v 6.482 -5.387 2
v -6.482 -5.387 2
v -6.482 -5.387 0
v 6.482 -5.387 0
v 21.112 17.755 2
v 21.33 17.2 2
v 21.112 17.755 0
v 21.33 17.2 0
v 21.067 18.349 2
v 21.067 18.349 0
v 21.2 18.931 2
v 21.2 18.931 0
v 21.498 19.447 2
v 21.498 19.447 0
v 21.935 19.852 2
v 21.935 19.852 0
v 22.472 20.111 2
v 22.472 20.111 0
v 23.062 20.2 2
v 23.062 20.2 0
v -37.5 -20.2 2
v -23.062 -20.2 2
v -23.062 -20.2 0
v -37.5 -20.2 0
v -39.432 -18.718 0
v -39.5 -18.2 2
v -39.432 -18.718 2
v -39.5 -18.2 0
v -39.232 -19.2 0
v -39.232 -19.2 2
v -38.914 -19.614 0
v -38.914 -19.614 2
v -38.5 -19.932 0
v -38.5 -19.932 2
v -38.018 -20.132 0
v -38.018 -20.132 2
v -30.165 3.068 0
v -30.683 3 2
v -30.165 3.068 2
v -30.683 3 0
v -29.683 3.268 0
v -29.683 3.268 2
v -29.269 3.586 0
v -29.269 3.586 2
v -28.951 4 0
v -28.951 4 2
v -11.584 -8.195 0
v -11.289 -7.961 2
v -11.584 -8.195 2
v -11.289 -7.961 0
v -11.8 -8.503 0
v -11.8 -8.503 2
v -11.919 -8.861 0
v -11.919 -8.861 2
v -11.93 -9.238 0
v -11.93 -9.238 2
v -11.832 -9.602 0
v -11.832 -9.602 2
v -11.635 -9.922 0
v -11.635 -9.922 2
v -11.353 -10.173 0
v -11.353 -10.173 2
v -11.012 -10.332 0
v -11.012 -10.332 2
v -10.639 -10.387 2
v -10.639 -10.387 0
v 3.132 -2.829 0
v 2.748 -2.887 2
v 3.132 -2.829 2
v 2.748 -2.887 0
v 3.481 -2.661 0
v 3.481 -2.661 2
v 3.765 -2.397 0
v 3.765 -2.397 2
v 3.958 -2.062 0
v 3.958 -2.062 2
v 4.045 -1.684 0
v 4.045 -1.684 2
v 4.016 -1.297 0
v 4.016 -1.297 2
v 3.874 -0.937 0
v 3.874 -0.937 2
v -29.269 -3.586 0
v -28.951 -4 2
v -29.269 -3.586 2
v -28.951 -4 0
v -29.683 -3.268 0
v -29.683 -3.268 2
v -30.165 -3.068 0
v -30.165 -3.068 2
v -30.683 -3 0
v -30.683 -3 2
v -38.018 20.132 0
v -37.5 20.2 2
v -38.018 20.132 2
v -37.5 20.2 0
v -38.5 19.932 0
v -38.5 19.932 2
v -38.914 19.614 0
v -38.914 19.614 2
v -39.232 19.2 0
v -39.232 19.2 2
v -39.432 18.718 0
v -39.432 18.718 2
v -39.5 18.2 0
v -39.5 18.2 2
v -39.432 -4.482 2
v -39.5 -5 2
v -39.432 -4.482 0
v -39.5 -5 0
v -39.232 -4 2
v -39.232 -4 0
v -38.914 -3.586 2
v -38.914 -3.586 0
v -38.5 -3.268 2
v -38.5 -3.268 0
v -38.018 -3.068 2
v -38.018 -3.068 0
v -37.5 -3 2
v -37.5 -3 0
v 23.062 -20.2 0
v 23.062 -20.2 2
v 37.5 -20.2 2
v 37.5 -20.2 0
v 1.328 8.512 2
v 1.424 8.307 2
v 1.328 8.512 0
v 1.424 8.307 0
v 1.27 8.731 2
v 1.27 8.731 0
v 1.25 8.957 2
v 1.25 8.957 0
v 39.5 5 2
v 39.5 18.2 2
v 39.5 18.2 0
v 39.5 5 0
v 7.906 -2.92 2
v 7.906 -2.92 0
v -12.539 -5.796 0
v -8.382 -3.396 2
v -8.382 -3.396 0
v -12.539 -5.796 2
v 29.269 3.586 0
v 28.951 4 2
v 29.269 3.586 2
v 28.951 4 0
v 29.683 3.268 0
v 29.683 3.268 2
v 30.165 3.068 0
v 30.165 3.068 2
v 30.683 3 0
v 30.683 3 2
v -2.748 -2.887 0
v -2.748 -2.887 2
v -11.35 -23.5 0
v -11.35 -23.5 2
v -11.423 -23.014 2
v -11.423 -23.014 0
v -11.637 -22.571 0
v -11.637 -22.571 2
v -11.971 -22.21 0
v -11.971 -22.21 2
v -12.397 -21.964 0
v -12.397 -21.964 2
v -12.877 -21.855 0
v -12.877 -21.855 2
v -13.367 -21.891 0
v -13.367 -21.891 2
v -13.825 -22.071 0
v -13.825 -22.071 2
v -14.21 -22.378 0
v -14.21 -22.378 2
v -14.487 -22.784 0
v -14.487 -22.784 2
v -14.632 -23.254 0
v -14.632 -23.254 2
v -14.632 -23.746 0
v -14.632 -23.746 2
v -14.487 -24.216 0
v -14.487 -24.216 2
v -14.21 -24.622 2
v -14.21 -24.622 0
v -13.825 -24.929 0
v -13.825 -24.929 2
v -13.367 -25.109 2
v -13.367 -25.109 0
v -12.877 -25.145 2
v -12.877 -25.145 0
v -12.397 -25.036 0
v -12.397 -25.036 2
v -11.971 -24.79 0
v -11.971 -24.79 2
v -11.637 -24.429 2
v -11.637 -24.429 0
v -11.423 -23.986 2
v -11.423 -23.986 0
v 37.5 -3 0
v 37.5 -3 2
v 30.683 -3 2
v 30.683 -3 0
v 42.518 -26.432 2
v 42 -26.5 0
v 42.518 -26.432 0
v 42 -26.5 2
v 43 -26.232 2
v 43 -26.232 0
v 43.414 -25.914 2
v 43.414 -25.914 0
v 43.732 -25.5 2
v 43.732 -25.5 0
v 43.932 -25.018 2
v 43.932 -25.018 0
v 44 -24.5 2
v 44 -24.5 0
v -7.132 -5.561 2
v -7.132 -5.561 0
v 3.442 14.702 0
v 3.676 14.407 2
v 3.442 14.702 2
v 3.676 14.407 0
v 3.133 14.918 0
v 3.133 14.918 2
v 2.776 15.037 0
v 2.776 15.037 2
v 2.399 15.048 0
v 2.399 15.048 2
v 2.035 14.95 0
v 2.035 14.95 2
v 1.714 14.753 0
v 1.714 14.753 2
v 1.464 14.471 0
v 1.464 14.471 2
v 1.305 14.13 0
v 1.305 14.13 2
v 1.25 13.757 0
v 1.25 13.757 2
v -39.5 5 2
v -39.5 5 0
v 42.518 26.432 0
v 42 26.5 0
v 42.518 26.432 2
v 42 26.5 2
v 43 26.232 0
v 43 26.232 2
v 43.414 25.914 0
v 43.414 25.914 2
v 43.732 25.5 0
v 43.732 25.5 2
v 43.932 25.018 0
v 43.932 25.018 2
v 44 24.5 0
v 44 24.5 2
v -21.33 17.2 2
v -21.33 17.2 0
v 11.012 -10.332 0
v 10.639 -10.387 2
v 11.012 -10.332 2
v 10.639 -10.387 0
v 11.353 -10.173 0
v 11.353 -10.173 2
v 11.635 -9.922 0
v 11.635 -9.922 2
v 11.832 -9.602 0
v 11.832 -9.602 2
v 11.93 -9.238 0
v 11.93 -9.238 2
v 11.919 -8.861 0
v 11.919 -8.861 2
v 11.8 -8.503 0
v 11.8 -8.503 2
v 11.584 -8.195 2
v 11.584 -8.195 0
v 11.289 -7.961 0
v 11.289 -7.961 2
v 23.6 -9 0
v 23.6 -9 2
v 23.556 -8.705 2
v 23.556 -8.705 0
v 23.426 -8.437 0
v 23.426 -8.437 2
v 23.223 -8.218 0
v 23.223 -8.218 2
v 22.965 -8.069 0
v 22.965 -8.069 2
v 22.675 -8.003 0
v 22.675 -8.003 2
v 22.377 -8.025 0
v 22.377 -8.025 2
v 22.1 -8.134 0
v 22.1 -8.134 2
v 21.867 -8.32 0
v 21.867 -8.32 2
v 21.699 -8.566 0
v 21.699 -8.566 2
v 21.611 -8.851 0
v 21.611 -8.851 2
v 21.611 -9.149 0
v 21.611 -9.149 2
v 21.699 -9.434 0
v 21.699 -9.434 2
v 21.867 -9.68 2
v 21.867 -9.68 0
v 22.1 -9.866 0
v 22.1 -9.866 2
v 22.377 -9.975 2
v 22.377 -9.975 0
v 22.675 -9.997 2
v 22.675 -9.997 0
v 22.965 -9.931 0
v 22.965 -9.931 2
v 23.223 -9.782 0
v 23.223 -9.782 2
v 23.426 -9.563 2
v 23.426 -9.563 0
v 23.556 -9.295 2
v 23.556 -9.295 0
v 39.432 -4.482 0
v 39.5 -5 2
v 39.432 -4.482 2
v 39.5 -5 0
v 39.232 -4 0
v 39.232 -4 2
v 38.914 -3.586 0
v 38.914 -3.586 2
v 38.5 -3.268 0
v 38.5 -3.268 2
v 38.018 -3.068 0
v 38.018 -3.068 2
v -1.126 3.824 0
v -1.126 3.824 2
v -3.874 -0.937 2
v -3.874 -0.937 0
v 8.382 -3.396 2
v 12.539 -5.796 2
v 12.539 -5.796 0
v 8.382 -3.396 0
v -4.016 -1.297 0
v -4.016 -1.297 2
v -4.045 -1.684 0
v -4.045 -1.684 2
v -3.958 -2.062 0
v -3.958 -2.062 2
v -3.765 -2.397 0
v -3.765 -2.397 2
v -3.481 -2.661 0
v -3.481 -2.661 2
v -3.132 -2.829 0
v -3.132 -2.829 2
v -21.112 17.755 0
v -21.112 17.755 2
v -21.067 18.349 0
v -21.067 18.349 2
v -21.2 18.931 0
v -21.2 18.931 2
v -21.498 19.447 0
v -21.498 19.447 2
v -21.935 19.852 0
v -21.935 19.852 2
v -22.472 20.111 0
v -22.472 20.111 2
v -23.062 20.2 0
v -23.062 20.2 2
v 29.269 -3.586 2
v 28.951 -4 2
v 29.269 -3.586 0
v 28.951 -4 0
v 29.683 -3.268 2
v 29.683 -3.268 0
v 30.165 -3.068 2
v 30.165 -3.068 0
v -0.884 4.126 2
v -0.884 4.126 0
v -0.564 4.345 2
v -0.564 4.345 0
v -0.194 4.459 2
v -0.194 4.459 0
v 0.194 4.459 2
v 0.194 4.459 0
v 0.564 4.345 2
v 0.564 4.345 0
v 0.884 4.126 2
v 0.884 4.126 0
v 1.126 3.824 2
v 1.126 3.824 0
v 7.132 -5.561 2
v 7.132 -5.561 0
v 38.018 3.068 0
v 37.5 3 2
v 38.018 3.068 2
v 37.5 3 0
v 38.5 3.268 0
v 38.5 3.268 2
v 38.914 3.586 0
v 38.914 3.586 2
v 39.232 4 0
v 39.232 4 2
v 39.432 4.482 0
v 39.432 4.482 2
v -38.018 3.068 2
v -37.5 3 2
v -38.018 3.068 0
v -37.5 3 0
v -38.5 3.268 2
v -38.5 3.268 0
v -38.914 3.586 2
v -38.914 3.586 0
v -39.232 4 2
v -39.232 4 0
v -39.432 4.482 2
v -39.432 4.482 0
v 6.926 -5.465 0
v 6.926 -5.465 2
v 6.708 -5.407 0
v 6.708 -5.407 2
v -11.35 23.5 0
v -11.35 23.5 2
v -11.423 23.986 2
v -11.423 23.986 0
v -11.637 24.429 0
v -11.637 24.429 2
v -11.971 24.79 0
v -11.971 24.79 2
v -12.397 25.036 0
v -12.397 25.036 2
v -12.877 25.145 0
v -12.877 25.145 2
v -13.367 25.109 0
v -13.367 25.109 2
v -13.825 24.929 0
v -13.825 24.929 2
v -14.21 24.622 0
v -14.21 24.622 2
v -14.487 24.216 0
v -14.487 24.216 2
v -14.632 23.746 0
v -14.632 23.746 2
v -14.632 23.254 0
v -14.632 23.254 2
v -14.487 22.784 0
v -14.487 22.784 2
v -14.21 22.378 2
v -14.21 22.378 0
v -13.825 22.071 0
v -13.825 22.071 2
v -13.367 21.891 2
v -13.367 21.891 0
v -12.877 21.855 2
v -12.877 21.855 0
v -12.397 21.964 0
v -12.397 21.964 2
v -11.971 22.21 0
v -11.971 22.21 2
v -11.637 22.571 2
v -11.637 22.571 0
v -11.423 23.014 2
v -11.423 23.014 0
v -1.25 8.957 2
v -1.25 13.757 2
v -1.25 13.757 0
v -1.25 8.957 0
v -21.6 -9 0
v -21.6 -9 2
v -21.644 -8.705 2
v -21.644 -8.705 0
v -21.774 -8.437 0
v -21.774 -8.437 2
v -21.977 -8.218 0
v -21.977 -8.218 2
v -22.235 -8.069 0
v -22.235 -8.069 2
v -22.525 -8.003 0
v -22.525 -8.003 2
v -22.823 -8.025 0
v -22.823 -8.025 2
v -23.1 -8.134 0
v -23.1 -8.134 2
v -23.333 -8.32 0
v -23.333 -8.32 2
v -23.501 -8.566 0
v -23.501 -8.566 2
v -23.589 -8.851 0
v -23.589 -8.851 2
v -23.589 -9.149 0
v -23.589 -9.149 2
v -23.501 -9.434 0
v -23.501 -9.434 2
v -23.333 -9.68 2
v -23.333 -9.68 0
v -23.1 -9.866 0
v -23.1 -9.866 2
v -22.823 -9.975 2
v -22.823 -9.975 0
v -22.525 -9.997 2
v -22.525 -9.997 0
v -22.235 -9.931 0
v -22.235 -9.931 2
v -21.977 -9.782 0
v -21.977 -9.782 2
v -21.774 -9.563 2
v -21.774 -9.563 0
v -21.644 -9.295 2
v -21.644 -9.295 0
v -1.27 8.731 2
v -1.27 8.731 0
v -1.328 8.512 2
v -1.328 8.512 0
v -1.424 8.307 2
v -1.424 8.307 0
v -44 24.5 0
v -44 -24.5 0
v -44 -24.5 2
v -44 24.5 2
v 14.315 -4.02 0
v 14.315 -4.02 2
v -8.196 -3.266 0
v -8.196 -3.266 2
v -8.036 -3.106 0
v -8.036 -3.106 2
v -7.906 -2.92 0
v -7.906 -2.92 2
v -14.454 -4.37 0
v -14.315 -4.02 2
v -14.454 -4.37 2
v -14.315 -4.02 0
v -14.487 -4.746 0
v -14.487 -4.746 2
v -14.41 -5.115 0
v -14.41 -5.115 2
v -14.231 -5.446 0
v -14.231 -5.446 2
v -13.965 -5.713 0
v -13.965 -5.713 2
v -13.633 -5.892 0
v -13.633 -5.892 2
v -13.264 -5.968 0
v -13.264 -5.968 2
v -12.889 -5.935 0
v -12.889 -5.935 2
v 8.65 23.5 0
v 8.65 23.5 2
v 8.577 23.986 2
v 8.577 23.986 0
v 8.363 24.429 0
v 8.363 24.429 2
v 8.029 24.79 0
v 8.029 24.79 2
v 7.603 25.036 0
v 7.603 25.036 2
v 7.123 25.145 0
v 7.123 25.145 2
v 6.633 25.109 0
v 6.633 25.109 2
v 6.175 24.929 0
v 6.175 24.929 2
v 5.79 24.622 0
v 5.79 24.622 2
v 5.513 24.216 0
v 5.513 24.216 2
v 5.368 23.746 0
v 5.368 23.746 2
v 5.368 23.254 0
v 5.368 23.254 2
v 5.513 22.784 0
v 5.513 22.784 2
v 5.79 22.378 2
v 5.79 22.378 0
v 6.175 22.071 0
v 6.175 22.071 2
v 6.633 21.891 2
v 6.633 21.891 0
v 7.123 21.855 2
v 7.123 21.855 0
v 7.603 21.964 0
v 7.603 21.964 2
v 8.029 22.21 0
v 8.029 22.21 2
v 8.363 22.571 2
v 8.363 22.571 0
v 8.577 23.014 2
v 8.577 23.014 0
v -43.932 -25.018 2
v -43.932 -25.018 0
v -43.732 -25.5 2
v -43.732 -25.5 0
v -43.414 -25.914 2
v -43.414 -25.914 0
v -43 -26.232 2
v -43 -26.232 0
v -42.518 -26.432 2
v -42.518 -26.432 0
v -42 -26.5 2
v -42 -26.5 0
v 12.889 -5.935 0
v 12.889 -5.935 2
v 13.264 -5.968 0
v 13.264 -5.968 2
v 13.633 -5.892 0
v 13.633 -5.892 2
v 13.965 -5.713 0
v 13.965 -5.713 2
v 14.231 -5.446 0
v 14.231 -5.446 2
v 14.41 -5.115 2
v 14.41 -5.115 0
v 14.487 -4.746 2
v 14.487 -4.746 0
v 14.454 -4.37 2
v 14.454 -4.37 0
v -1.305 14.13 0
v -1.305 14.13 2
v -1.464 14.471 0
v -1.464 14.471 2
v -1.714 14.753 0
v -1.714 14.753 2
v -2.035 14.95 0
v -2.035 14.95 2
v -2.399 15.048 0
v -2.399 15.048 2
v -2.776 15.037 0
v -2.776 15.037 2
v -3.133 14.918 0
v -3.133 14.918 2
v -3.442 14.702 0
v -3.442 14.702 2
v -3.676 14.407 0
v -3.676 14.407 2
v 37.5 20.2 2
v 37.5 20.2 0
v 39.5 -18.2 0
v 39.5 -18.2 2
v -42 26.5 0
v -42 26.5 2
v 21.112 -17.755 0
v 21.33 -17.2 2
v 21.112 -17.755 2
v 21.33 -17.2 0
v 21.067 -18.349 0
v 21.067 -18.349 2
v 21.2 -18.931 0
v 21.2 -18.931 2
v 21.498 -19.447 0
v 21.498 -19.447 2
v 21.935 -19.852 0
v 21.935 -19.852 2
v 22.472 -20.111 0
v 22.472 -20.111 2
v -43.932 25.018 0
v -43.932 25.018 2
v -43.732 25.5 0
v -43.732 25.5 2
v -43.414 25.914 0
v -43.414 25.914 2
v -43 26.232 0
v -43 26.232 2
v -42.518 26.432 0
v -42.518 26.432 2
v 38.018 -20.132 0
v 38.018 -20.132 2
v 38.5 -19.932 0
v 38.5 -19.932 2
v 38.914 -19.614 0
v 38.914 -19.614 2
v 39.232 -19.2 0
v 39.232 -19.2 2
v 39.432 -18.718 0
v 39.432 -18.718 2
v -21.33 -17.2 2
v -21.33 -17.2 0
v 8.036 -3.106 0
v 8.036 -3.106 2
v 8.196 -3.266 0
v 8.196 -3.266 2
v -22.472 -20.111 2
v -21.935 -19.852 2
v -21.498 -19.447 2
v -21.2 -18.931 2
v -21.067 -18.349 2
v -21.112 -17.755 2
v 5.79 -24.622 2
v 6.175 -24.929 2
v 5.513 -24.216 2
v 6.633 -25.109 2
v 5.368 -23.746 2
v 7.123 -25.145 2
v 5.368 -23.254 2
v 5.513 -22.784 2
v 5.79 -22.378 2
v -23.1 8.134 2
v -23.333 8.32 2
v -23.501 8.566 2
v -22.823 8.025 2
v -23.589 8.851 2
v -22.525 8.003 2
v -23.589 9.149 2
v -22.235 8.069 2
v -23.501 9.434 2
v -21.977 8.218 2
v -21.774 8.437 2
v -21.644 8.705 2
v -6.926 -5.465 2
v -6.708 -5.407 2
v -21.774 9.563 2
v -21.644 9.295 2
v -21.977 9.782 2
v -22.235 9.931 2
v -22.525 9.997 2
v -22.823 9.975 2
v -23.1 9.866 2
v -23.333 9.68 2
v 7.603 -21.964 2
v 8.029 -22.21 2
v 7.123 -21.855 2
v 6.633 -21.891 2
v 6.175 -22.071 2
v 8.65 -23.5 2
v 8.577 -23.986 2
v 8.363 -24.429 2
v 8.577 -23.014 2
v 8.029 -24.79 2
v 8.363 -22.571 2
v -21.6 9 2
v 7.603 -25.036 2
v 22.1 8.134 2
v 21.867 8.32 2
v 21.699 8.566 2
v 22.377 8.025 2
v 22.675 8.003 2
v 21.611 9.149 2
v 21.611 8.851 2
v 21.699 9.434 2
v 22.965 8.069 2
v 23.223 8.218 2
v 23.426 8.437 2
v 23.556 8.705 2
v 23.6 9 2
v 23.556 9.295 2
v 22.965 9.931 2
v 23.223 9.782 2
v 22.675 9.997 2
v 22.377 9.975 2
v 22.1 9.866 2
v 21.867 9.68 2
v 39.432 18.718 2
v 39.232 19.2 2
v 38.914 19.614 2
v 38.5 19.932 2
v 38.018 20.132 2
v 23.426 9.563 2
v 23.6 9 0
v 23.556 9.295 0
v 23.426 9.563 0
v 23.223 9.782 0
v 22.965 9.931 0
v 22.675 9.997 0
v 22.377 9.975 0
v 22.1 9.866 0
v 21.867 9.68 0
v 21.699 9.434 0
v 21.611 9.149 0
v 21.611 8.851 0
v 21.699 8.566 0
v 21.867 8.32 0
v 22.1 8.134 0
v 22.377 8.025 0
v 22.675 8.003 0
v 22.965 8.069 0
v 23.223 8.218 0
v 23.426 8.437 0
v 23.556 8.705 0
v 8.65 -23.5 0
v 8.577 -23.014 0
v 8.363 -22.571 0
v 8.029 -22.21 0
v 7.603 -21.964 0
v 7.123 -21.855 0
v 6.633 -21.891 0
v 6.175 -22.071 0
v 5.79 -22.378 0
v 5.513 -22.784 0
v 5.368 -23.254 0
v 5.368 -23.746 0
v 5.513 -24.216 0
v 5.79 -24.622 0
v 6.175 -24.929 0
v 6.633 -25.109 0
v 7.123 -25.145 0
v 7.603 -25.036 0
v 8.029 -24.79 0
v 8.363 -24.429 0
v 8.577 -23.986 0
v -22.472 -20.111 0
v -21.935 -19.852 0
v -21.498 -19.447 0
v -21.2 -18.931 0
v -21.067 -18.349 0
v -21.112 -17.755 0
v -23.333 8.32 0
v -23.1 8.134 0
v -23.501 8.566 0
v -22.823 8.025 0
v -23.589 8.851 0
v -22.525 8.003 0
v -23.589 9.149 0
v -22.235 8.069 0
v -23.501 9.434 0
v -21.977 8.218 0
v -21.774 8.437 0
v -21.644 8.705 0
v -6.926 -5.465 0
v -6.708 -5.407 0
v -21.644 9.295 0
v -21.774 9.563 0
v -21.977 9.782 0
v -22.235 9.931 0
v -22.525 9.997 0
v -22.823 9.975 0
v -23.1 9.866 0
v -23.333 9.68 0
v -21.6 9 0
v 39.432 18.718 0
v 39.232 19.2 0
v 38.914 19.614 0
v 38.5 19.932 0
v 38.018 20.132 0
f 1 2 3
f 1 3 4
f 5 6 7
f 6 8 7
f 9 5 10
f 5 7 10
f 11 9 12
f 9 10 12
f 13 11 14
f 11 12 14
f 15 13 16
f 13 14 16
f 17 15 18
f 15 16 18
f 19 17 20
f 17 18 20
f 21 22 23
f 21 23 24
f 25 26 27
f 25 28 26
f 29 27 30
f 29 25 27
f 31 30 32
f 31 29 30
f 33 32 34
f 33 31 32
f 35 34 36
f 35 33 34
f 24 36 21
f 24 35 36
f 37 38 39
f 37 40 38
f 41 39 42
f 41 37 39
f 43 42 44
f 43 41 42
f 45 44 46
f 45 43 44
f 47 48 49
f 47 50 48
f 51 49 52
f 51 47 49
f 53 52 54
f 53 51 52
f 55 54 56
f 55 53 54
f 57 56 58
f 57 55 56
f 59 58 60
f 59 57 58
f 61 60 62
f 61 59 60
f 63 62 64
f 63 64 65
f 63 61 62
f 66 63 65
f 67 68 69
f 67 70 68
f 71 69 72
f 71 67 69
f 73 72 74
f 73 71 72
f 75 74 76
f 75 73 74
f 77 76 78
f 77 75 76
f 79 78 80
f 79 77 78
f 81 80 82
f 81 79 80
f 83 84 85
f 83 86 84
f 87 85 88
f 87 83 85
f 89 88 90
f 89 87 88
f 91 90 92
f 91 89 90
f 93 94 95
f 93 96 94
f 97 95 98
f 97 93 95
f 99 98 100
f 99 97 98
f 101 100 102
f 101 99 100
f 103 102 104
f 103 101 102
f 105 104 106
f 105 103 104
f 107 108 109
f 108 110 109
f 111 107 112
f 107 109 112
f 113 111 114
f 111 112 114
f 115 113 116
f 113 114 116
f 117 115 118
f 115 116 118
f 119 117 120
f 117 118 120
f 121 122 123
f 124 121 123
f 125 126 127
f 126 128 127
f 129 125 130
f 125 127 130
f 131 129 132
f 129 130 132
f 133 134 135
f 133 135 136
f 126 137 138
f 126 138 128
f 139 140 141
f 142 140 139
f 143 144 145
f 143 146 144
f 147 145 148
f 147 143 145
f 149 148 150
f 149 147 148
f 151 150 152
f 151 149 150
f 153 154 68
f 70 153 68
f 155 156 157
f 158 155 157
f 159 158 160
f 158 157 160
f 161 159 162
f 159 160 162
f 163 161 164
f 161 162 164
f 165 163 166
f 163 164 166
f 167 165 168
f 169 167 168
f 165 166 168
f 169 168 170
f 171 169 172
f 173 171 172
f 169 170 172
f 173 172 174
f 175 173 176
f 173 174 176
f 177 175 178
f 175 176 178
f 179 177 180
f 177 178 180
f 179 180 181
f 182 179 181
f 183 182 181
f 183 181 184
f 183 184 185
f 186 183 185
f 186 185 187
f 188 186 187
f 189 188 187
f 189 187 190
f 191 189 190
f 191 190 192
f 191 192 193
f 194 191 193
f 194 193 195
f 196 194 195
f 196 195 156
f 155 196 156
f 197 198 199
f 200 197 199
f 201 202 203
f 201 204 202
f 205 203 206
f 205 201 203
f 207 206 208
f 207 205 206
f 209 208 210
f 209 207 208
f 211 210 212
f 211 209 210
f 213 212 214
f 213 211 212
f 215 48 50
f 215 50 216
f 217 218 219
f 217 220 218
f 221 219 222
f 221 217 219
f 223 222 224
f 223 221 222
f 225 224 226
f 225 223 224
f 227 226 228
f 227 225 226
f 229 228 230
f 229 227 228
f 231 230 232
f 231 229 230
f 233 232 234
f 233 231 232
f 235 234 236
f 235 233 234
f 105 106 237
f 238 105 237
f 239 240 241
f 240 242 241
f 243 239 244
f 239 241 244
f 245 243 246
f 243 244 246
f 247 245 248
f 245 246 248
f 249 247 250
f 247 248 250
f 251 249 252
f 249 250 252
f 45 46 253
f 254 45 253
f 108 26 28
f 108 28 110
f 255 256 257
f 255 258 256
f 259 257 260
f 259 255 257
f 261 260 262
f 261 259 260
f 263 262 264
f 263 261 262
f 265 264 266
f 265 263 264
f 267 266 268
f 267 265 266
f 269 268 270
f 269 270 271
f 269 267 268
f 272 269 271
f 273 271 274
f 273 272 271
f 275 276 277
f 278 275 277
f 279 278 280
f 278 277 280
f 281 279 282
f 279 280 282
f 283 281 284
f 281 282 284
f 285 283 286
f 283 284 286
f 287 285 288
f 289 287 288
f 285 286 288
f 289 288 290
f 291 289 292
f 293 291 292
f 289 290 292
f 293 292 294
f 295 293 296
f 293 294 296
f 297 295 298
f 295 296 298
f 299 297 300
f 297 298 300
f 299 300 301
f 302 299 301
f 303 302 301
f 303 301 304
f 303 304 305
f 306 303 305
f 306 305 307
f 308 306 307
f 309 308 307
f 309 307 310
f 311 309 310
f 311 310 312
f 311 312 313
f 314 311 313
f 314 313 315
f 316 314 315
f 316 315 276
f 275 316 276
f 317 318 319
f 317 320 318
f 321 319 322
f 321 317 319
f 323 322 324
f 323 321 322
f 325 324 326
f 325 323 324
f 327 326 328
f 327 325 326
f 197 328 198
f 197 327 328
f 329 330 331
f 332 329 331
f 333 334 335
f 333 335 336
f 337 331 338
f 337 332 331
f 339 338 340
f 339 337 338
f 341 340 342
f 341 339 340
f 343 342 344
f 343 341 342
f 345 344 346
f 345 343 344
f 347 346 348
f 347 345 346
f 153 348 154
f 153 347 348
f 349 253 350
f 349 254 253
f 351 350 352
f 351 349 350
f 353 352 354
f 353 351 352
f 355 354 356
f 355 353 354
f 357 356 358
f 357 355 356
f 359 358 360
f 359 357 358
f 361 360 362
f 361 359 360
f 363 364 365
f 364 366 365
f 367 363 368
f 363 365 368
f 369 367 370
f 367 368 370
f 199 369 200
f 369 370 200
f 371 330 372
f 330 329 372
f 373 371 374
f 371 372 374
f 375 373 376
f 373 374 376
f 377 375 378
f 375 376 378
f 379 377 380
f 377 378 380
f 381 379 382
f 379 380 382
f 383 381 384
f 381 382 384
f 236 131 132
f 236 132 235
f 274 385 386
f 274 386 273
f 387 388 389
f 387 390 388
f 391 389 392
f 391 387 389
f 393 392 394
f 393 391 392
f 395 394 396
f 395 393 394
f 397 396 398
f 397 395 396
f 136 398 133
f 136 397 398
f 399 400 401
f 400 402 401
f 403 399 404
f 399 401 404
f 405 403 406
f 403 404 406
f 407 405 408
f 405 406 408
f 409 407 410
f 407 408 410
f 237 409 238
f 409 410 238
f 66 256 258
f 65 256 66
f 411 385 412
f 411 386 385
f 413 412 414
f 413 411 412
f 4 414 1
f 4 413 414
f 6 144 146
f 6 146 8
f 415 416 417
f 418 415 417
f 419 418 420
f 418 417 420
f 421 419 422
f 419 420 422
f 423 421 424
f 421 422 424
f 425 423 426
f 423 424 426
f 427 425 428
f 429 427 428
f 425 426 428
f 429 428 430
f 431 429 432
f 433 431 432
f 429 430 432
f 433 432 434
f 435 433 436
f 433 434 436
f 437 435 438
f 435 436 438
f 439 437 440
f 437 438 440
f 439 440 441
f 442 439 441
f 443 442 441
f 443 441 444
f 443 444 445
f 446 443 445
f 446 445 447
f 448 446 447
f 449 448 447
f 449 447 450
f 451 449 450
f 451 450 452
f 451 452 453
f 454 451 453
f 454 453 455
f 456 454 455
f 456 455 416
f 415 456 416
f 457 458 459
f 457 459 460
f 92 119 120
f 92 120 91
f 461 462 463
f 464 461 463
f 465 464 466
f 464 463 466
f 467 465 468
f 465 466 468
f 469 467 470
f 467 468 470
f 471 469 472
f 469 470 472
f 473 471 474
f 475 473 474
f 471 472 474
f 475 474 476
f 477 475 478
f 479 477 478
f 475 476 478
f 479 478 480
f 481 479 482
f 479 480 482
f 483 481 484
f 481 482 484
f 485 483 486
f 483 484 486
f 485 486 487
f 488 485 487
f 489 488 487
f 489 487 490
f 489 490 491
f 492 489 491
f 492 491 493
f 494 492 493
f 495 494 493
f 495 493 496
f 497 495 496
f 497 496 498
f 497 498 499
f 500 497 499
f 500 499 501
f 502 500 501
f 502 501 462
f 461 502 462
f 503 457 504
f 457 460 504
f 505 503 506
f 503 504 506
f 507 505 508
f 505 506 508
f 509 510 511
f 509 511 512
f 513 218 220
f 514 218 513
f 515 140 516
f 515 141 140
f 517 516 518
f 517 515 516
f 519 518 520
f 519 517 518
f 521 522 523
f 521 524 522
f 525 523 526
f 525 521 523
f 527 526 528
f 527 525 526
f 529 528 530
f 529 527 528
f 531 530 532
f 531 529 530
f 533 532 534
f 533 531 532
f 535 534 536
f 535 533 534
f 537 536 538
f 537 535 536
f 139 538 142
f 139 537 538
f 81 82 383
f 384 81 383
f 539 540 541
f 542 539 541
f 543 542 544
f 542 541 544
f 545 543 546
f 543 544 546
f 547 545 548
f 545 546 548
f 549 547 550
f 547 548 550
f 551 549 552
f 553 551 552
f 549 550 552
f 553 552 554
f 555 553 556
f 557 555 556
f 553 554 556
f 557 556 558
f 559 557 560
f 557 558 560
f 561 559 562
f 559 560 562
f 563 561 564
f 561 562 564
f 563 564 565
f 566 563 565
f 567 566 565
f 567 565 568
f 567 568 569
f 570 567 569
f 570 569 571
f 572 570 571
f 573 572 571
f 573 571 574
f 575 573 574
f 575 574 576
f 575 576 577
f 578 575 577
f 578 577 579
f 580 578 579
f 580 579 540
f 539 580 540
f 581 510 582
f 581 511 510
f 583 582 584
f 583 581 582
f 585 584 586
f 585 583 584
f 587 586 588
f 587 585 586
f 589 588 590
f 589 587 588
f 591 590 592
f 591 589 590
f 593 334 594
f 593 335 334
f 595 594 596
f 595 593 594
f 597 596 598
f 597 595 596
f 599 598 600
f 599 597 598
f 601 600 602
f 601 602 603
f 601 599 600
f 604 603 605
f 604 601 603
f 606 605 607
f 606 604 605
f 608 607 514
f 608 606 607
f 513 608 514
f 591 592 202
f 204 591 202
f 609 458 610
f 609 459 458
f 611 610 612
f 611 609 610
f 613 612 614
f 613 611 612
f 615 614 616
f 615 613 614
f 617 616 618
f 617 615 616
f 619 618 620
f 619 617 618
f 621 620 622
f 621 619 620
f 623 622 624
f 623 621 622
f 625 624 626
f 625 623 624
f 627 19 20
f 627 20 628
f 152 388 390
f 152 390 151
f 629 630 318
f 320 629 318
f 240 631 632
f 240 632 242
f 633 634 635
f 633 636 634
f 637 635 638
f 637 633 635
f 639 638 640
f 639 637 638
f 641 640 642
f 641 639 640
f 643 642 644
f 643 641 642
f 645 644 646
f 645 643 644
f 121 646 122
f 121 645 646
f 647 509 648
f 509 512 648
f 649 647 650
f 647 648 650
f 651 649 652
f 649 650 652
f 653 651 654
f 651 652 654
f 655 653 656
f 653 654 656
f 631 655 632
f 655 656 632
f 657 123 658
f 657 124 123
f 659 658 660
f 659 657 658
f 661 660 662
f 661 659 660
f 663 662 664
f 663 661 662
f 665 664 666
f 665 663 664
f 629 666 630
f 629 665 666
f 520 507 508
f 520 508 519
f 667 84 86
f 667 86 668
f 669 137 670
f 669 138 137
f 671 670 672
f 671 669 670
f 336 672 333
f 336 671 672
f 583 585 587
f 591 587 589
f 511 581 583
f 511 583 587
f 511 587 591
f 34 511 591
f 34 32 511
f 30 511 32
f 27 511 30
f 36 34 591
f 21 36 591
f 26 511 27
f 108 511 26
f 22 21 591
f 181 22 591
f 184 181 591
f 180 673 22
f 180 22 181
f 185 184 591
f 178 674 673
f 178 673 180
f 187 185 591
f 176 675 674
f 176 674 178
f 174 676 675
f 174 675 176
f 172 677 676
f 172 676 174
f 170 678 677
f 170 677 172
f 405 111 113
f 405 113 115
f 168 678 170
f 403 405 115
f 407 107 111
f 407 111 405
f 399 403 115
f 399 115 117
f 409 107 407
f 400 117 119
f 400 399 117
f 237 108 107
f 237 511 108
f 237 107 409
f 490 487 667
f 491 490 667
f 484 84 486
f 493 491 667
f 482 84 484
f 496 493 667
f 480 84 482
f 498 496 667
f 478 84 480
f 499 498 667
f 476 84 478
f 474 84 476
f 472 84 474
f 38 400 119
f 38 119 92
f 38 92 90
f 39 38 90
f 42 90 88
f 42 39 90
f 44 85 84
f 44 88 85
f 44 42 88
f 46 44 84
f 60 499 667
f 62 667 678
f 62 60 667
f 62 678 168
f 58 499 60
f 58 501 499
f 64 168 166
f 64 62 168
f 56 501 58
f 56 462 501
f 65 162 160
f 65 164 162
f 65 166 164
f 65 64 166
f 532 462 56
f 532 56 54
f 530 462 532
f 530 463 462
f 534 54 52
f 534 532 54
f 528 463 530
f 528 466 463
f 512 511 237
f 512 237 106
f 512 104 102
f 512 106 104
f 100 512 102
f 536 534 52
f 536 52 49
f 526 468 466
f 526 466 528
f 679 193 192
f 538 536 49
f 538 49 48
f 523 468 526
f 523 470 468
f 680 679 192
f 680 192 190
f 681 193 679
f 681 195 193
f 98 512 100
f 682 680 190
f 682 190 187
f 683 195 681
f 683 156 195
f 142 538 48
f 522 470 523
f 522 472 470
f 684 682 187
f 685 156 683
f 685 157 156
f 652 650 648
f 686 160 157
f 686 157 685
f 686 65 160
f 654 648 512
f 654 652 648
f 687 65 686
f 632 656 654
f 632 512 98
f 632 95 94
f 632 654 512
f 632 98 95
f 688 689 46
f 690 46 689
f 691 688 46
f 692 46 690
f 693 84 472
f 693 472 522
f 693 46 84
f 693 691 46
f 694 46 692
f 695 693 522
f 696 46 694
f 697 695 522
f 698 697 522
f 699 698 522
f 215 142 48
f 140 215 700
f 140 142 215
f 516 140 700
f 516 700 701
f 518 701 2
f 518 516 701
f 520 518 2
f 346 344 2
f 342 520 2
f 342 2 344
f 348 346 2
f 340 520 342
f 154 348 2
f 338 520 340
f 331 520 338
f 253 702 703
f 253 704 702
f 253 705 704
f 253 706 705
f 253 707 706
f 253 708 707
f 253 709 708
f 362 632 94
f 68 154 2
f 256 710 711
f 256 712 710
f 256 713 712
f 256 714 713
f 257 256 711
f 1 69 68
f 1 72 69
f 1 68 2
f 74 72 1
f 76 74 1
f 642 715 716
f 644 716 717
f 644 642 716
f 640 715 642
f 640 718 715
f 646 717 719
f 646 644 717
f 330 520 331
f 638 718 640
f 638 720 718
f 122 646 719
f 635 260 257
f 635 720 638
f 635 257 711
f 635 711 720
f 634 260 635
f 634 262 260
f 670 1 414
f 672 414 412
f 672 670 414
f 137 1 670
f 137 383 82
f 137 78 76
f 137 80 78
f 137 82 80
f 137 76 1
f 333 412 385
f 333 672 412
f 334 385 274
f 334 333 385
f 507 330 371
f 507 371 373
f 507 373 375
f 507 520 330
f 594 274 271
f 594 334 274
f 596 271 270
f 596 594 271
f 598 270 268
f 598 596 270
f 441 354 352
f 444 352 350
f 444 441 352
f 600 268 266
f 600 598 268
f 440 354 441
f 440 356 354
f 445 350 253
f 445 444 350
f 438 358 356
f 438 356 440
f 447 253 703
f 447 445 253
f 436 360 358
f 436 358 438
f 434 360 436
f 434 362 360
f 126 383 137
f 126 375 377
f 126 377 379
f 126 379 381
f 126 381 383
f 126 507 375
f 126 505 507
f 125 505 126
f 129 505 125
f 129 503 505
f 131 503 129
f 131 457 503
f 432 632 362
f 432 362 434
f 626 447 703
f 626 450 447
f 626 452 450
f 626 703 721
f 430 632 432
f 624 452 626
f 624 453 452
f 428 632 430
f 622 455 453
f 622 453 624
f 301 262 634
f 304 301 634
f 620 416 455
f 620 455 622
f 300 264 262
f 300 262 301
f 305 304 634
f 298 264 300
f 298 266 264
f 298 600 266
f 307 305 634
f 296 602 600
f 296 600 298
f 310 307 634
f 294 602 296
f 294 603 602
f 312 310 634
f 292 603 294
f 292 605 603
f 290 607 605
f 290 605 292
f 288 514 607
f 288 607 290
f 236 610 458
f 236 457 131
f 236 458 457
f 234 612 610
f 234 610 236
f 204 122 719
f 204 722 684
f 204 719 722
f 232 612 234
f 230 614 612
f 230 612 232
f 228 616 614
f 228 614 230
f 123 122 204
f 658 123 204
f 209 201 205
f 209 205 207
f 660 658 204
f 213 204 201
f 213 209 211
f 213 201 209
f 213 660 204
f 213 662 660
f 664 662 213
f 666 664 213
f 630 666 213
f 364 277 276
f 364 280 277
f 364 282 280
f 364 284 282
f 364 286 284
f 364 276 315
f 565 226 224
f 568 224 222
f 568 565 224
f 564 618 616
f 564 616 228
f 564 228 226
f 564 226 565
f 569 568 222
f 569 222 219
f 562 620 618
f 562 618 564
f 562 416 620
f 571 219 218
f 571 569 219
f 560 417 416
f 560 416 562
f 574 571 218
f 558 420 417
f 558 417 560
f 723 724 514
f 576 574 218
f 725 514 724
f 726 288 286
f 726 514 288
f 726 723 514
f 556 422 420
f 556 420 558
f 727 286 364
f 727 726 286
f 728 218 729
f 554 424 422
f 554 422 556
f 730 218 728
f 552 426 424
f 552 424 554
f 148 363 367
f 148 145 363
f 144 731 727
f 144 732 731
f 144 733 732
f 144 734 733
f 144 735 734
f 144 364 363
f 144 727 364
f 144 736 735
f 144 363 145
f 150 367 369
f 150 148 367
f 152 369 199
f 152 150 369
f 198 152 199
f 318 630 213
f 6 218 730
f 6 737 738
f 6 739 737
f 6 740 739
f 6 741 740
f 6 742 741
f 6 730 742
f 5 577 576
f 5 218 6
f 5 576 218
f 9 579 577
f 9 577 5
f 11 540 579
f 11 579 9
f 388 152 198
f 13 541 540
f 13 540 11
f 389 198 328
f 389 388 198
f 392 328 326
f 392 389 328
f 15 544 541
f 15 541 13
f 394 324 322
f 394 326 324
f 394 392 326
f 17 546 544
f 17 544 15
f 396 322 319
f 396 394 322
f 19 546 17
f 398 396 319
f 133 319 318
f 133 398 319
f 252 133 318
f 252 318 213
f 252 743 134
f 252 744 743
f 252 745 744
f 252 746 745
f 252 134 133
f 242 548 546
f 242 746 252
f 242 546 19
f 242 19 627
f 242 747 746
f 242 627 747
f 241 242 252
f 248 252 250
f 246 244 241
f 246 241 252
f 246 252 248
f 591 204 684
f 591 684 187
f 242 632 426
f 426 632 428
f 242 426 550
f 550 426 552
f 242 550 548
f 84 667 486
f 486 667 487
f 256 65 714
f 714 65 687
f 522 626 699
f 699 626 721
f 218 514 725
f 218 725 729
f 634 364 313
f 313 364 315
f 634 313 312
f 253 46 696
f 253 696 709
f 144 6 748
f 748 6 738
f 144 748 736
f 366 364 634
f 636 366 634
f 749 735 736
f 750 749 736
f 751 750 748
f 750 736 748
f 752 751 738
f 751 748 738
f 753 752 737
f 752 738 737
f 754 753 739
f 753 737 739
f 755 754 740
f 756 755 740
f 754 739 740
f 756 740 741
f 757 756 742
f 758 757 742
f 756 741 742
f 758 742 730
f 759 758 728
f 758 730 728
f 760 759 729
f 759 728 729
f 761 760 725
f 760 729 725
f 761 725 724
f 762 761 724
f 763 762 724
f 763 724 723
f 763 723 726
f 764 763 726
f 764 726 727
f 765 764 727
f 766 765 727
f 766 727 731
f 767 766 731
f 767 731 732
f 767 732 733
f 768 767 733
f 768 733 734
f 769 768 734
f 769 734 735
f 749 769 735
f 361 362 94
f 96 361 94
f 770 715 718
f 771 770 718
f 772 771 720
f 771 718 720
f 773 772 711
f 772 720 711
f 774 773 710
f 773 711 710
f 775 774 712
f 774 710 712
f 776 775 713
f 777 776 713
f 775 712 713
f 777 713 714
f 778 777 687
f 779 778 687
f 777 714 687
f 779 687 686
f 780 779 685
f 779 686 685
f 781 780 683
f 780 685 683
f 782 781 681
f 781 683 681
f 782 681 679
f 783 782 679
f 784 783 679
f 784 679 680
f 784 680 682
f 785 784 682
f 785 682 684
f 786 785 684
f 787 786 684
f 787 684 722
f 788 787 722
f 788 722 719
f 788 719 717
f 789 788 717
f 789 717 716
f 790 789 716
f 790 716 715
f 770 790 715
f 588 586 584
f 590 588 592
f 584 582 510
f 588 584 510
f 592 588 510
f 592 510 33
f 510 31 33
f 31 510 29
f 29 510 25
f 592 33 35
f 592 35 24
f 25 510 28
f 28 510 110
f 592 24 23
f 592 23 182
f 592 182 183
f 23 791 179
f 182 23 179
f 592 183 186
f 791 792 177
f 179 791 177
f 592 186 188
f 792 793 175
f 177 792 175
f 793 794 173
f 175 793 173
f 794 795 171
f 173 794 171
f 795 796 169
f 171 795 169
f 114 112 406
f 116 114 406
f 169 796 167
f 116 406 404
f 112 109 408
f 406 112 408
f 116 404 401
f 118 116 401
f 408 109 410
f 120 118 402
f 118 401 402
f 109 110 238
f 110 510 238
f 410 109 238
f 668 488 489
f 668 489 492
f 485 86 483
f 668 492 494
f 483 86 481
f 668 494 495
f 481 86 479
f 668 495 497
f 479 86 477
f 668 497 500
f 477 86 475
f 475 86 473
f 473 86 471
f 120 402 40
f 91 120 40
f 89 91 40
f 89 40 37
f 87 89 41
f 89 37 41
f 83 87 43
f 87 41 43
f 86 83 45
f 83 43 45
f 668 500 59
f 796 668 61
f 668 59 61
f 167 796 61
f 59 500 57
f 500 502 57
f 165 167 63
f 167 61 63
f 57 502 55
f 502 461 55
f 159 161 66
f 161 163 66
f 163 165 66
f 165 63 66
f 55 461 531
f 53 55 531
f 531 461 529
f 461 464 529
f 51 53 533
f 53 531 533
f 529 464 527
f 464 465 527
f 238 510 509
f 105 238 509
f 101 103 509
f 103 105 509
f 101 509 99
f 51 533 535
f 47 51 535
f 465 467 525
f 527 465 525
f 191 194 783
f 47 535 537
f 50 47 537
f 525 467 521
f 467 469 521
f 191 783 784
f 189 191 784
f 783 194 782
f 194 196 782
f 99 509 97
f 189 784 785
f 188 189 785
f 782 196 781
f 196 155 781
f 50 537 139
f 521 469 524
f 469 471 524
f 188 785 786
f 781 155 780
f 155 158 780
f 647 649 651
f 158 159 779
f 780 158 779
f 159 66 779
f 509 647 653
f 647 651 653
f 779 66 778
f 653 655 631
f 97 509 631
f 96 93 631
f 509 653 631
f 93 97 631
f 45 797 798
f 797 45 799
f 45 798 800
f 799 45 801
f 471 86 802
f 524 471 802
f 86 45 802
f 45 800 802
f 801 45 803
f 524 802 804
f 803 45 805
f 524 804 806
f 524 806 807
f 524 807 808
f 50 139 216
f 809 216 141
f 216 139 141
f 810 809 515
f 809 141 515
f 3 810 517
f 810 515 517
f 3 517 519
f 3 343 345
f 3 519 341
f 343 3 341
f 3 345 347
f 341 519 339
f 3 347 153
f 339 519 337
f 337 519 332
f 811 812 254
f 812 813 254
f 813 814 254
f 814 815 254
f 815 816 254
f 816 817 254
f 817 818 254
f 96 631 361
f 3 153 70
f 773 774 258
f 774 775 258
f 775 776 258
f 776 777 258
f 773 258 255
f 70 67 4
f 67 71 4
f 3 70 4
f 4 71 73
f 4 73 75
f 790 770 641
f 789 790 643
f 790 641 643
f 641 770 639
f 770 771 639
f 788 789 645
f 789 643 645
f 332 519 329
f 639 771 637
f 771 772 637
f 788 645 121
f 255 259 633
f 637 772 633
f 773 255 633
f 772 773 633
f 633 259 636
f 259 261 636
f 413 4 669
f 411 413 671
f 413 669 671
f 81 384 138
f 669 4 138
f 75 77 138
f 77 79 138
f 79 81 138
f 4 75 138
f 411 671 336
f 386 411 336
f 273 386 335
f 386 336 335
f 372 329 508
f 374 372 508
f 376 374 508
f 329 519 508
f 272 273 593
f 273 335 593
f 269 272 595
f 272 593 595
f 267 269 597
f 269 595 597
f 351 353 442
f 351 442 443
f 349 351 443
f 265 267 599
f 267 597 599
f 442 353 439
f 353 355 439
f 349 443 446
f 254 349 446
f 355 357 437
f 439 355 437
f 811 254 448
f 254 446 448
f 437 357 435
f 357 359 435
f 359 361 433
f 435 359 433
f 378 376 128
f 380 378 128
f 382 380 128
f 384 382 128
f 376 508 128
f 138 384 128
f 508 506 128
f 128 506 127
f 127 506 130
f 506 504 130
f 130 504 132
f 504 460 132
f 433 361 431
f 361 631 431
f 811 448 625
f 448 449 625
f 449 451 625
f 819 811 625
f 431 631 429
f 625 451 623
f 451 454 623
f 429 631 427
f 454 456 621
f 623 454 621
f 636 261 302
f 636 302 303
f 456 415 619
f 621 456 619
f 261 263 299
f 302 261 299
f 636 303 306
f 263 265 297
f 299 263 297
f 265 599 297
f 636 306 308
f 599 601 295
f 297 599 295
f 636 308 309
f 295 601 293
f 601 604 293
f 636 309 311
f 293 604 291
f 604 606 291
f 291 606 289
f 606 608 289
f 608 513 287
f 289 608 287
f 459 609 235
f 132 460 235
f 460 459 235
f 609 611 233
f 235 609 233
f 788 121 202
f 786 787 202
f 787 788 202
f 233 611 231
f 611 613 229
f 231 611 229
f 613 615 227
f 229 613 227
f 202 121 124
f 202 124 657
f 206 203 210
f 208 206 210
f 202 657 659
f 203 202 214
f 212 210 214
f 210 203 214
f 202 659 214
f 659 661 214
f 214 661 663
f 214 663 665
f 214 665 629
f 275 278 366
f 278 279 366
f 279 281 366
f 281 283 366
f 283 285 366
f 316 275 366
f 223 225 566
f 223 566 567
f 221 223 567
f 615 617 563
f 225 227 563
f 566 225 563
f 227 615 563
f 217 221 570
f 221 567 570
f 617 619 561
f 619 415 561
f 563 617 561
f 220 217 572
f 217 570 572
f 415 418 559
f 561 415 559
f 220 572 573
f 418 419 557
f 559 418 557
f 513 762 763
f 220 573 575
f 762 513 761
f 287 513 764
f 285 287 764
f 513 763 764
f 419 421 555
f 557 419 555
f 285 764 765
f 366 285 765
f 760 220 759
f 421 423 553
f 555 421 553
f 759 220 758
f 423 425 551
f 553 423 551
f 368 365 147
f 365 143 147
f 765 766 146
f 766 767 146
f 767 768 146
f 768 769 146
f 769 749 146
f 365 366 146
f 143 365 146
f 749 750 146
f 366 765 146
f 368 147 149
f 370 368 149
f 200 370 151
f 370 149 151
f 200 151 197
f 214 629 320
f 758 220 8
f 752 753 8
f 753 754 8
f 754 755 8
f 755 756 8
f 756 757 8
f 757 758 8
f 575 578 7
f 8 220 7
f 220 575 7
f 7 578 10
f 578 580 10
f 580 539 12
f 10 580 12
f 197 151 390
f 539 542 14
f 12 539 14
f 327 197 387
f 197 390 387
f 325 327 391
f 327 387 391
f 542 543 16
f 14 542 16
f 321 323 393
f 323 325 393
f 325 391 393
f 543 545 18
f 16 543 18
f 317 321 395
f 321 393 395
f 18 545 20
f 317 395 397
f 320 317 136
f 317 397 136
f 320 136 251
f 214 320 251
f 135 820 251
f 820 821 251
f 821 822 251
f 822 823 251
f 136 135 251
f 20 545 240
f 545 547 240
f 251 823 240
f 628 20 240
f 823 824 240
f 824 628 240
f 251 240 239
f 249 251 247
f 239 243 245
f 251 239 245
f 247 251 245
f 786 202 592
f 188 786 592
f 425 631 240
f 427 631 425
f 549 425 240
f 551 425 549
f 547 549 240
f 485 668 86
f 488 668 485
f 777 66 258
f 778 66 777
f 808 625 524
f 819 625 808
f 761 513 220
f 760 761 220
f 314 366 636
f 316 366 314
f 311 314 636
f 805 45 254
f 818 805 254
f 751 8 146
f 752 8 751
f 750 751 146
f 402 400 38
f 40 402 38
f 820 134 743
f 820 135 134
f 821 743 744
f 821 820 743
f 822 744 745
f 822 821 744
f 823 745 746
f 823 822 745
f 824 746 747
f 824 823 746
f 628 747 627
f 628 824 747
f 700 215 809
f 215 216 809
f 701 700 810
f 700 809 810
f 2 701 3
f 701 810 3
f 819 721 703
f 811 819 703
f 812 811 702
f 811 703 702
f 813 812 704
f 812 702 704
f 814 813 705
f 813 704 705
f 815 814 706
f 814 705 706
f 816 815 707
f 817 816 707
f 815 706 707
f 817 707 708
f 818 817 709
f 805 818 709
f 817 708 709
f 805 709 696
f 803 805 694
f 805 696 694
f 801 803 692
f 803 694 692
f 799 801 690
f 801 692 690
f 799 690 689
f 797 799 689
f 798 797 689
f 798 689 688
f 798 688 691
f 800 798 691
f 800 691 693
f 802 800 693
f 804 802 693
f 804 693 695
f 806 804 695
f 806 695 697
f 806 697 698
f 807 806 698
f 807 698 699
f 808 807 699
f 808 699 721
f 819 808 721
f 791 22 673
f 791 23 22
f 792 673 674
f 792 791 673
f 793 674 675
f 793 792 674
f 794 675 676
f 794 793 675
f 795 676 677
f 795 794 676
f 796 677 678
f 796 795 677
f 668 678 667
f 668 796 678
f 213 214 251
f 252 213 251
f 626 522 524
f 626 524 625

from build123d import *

# Parameters (mm, degrees)
SKETCH_1_W          = 88
SKETCH_1_H          = 53
EXTRUDE_1_DEPTH     = 2
SKETCH_2_R          = 1.65
SKETCH_2_R_2        = 1
CUT_EXTRUDE_1_DEPTH = 10
CUT_EXTRUDE_2_DEPTH = 10
FILLET_1_R          = 1.3
FILLET_4_R          = 2
CUT_EXTRUDE_6_DEPTH = 10
FILLET_5_R          = 2


with BuildPart() as part:
    # 草图1 → 凸台-拉伸1 (new body)
    with BuildSketch(Plane.XY):
        Rectangle(SKETCH_1_W, SKETCH_1_H)
    extrude(amount=EXTRUDE_1_DEPTH)

    # 草图2 → 切除-拉伸1 (cut)
    with BuildSketch(Plane.XY.offset(2)):
        with Locations((7, -23.5)):
            Circle(SKETCH_2_R)
        with Locations((-13, -23.5)):
            Circle(SKETCH_2_R)
        with Locations((-13, 23.5)):
            Circle(SKETCH_2_R)
        with Locations((7, 23.5)):
            Circle(SKETCH_2_R)
        with Locations((22.6, 9)):
            Circle(SKETCH_2_R_2)
        with Locations((22.6, -9)):
            Circle(SKETCH_2_R_2)
        with Locations((-22.6, -9)):
            Circle(SKETCH_2_R_2)
        with Locations((-22.6, 9)):
            Circle(SKETCH_2_R_2)
    extrude(amount=-CUT_EXTRUDE_1_DEPTH, mode=Mode.SUBTRACT)

    # 草图3 → 切除-拉伸2 (cut)
    with BuildSketch(Plane.XY.offset(2)):
        Polygon((0, 5.773502692), (-5, -2.886751346), (5, -2.886751346), align=None)
        Polygon((1.25, 8.608439182), (1.25, 18.608439182), (16.740381057, -8.221687836), (8.080127019, -3.221687836), align=None)
        Polygon((-6.830127019, -5.386751346), (6.830127019, -5.386751346), (15.490381057, -10.386751346), (-15.490381057, -10.386751346), align=None)
        Polygon((-1.25, 8.608439182), (-8.080127019, -3.221687836), (-16.740381057, -8.221687836), (-1.25, 18.608439182), align=None)
    extrude(amount=-CUT_EXTRUDE_2_DEPTH, mode=Mode.SUBTRACT)

    # 圆角1
    fillet_1_edges = [part.edges().sort_by_distance(p)[0] for p in [
        (6.830127019, -5.386751346, 1),
        (15.490381057, -10.386751346, 1),
        (-15.490381057, -10.386751346, 1),
        (-6.830127019, -5.386751346, 1),
        (8.080127019, -3.221687836, 1),
        (1.25, 8.608439182, 1),
        (1.25, 18.608439182, 1),
        (16.740381057, -8.221687836, 1),
        (-8.080127019, -3.221687836, 1),
        (-16.740381057, -8.221687836, 1),
        (-1.25, 18.608439182, 1),
        (-1.25, 8.608439182, 1),
        (5, -2.886751346, 1),
        (-5, -2.886751346, 1),
        (0, 5.773502692, 1),
    ]]
    fillet(fillet_1_edges, radius=FILLET_1_R)

    # 圆角4
    fillet_4_edges = [part.edges().sort_by_distance(p)[0] for p in [
        (44, -26.5, 1),
        (-44, -26.5, 1),
        (-44, 26.5, 1),
        (44, 26.5, 1),
    ]]
    fillet(fillet_4_edges, radius=FILLET_4_R)

    # 草图7 → 切除-拉伸6 (cut)
    with BuildSketch(Plane.XY.offset(2)):
        Polygon((19.5977786, 20.2), (39.5, 20.2), (39.5, 3), (29.52820323, 3), align=None)
        Polygon((29.52820323, -3), (19.5977786, -20.2), (39.5, -20.2), (39.5, -3), align=None)
        Polygon((-39.5, -3), (-29.52820323, -3), (-19.5977786, -20.2), (-39.5, -20.2), align=None)
        Polygon((-39.5, 3), (-29.52820323, 3), (-19.5977786, 20.2), (-39.5, 20.2), align=None)
    extrude(amount=-CUT_EXTRUDE_6_DEPTH, mode=Mode.SUBTRACT)

    # 圆角5
    fillet_5_edges = [part.edges().sort_by_distance(p)[0] for p in [
        (-39.5, 3, 1),
        (-39.5, 20.2, 1),
        (-19.5977786, 20.2, 1),
        (-29.52820323, 3, 1),
        (29.52820323, -3, 1),
        (39.5, -3, 1),
        (39.5, -20.2, 1),
        (19.5977786, -20.2, 1),
        (-39.5, -20.2, 1),
        (-39.5, -3, 1),
        (-29.52820323, -3, 1),
        (-19.5977786, -20.2, 1),
        (29.52820323, 3, 1),
        (19.5977786, 20.2, 1),
        (39.5, 20.2, 1),
        (39.5, 3, 1),
    ]]
    fillet(fillet_5_edges, radius=FILLET_5_R)


solid = part.part
